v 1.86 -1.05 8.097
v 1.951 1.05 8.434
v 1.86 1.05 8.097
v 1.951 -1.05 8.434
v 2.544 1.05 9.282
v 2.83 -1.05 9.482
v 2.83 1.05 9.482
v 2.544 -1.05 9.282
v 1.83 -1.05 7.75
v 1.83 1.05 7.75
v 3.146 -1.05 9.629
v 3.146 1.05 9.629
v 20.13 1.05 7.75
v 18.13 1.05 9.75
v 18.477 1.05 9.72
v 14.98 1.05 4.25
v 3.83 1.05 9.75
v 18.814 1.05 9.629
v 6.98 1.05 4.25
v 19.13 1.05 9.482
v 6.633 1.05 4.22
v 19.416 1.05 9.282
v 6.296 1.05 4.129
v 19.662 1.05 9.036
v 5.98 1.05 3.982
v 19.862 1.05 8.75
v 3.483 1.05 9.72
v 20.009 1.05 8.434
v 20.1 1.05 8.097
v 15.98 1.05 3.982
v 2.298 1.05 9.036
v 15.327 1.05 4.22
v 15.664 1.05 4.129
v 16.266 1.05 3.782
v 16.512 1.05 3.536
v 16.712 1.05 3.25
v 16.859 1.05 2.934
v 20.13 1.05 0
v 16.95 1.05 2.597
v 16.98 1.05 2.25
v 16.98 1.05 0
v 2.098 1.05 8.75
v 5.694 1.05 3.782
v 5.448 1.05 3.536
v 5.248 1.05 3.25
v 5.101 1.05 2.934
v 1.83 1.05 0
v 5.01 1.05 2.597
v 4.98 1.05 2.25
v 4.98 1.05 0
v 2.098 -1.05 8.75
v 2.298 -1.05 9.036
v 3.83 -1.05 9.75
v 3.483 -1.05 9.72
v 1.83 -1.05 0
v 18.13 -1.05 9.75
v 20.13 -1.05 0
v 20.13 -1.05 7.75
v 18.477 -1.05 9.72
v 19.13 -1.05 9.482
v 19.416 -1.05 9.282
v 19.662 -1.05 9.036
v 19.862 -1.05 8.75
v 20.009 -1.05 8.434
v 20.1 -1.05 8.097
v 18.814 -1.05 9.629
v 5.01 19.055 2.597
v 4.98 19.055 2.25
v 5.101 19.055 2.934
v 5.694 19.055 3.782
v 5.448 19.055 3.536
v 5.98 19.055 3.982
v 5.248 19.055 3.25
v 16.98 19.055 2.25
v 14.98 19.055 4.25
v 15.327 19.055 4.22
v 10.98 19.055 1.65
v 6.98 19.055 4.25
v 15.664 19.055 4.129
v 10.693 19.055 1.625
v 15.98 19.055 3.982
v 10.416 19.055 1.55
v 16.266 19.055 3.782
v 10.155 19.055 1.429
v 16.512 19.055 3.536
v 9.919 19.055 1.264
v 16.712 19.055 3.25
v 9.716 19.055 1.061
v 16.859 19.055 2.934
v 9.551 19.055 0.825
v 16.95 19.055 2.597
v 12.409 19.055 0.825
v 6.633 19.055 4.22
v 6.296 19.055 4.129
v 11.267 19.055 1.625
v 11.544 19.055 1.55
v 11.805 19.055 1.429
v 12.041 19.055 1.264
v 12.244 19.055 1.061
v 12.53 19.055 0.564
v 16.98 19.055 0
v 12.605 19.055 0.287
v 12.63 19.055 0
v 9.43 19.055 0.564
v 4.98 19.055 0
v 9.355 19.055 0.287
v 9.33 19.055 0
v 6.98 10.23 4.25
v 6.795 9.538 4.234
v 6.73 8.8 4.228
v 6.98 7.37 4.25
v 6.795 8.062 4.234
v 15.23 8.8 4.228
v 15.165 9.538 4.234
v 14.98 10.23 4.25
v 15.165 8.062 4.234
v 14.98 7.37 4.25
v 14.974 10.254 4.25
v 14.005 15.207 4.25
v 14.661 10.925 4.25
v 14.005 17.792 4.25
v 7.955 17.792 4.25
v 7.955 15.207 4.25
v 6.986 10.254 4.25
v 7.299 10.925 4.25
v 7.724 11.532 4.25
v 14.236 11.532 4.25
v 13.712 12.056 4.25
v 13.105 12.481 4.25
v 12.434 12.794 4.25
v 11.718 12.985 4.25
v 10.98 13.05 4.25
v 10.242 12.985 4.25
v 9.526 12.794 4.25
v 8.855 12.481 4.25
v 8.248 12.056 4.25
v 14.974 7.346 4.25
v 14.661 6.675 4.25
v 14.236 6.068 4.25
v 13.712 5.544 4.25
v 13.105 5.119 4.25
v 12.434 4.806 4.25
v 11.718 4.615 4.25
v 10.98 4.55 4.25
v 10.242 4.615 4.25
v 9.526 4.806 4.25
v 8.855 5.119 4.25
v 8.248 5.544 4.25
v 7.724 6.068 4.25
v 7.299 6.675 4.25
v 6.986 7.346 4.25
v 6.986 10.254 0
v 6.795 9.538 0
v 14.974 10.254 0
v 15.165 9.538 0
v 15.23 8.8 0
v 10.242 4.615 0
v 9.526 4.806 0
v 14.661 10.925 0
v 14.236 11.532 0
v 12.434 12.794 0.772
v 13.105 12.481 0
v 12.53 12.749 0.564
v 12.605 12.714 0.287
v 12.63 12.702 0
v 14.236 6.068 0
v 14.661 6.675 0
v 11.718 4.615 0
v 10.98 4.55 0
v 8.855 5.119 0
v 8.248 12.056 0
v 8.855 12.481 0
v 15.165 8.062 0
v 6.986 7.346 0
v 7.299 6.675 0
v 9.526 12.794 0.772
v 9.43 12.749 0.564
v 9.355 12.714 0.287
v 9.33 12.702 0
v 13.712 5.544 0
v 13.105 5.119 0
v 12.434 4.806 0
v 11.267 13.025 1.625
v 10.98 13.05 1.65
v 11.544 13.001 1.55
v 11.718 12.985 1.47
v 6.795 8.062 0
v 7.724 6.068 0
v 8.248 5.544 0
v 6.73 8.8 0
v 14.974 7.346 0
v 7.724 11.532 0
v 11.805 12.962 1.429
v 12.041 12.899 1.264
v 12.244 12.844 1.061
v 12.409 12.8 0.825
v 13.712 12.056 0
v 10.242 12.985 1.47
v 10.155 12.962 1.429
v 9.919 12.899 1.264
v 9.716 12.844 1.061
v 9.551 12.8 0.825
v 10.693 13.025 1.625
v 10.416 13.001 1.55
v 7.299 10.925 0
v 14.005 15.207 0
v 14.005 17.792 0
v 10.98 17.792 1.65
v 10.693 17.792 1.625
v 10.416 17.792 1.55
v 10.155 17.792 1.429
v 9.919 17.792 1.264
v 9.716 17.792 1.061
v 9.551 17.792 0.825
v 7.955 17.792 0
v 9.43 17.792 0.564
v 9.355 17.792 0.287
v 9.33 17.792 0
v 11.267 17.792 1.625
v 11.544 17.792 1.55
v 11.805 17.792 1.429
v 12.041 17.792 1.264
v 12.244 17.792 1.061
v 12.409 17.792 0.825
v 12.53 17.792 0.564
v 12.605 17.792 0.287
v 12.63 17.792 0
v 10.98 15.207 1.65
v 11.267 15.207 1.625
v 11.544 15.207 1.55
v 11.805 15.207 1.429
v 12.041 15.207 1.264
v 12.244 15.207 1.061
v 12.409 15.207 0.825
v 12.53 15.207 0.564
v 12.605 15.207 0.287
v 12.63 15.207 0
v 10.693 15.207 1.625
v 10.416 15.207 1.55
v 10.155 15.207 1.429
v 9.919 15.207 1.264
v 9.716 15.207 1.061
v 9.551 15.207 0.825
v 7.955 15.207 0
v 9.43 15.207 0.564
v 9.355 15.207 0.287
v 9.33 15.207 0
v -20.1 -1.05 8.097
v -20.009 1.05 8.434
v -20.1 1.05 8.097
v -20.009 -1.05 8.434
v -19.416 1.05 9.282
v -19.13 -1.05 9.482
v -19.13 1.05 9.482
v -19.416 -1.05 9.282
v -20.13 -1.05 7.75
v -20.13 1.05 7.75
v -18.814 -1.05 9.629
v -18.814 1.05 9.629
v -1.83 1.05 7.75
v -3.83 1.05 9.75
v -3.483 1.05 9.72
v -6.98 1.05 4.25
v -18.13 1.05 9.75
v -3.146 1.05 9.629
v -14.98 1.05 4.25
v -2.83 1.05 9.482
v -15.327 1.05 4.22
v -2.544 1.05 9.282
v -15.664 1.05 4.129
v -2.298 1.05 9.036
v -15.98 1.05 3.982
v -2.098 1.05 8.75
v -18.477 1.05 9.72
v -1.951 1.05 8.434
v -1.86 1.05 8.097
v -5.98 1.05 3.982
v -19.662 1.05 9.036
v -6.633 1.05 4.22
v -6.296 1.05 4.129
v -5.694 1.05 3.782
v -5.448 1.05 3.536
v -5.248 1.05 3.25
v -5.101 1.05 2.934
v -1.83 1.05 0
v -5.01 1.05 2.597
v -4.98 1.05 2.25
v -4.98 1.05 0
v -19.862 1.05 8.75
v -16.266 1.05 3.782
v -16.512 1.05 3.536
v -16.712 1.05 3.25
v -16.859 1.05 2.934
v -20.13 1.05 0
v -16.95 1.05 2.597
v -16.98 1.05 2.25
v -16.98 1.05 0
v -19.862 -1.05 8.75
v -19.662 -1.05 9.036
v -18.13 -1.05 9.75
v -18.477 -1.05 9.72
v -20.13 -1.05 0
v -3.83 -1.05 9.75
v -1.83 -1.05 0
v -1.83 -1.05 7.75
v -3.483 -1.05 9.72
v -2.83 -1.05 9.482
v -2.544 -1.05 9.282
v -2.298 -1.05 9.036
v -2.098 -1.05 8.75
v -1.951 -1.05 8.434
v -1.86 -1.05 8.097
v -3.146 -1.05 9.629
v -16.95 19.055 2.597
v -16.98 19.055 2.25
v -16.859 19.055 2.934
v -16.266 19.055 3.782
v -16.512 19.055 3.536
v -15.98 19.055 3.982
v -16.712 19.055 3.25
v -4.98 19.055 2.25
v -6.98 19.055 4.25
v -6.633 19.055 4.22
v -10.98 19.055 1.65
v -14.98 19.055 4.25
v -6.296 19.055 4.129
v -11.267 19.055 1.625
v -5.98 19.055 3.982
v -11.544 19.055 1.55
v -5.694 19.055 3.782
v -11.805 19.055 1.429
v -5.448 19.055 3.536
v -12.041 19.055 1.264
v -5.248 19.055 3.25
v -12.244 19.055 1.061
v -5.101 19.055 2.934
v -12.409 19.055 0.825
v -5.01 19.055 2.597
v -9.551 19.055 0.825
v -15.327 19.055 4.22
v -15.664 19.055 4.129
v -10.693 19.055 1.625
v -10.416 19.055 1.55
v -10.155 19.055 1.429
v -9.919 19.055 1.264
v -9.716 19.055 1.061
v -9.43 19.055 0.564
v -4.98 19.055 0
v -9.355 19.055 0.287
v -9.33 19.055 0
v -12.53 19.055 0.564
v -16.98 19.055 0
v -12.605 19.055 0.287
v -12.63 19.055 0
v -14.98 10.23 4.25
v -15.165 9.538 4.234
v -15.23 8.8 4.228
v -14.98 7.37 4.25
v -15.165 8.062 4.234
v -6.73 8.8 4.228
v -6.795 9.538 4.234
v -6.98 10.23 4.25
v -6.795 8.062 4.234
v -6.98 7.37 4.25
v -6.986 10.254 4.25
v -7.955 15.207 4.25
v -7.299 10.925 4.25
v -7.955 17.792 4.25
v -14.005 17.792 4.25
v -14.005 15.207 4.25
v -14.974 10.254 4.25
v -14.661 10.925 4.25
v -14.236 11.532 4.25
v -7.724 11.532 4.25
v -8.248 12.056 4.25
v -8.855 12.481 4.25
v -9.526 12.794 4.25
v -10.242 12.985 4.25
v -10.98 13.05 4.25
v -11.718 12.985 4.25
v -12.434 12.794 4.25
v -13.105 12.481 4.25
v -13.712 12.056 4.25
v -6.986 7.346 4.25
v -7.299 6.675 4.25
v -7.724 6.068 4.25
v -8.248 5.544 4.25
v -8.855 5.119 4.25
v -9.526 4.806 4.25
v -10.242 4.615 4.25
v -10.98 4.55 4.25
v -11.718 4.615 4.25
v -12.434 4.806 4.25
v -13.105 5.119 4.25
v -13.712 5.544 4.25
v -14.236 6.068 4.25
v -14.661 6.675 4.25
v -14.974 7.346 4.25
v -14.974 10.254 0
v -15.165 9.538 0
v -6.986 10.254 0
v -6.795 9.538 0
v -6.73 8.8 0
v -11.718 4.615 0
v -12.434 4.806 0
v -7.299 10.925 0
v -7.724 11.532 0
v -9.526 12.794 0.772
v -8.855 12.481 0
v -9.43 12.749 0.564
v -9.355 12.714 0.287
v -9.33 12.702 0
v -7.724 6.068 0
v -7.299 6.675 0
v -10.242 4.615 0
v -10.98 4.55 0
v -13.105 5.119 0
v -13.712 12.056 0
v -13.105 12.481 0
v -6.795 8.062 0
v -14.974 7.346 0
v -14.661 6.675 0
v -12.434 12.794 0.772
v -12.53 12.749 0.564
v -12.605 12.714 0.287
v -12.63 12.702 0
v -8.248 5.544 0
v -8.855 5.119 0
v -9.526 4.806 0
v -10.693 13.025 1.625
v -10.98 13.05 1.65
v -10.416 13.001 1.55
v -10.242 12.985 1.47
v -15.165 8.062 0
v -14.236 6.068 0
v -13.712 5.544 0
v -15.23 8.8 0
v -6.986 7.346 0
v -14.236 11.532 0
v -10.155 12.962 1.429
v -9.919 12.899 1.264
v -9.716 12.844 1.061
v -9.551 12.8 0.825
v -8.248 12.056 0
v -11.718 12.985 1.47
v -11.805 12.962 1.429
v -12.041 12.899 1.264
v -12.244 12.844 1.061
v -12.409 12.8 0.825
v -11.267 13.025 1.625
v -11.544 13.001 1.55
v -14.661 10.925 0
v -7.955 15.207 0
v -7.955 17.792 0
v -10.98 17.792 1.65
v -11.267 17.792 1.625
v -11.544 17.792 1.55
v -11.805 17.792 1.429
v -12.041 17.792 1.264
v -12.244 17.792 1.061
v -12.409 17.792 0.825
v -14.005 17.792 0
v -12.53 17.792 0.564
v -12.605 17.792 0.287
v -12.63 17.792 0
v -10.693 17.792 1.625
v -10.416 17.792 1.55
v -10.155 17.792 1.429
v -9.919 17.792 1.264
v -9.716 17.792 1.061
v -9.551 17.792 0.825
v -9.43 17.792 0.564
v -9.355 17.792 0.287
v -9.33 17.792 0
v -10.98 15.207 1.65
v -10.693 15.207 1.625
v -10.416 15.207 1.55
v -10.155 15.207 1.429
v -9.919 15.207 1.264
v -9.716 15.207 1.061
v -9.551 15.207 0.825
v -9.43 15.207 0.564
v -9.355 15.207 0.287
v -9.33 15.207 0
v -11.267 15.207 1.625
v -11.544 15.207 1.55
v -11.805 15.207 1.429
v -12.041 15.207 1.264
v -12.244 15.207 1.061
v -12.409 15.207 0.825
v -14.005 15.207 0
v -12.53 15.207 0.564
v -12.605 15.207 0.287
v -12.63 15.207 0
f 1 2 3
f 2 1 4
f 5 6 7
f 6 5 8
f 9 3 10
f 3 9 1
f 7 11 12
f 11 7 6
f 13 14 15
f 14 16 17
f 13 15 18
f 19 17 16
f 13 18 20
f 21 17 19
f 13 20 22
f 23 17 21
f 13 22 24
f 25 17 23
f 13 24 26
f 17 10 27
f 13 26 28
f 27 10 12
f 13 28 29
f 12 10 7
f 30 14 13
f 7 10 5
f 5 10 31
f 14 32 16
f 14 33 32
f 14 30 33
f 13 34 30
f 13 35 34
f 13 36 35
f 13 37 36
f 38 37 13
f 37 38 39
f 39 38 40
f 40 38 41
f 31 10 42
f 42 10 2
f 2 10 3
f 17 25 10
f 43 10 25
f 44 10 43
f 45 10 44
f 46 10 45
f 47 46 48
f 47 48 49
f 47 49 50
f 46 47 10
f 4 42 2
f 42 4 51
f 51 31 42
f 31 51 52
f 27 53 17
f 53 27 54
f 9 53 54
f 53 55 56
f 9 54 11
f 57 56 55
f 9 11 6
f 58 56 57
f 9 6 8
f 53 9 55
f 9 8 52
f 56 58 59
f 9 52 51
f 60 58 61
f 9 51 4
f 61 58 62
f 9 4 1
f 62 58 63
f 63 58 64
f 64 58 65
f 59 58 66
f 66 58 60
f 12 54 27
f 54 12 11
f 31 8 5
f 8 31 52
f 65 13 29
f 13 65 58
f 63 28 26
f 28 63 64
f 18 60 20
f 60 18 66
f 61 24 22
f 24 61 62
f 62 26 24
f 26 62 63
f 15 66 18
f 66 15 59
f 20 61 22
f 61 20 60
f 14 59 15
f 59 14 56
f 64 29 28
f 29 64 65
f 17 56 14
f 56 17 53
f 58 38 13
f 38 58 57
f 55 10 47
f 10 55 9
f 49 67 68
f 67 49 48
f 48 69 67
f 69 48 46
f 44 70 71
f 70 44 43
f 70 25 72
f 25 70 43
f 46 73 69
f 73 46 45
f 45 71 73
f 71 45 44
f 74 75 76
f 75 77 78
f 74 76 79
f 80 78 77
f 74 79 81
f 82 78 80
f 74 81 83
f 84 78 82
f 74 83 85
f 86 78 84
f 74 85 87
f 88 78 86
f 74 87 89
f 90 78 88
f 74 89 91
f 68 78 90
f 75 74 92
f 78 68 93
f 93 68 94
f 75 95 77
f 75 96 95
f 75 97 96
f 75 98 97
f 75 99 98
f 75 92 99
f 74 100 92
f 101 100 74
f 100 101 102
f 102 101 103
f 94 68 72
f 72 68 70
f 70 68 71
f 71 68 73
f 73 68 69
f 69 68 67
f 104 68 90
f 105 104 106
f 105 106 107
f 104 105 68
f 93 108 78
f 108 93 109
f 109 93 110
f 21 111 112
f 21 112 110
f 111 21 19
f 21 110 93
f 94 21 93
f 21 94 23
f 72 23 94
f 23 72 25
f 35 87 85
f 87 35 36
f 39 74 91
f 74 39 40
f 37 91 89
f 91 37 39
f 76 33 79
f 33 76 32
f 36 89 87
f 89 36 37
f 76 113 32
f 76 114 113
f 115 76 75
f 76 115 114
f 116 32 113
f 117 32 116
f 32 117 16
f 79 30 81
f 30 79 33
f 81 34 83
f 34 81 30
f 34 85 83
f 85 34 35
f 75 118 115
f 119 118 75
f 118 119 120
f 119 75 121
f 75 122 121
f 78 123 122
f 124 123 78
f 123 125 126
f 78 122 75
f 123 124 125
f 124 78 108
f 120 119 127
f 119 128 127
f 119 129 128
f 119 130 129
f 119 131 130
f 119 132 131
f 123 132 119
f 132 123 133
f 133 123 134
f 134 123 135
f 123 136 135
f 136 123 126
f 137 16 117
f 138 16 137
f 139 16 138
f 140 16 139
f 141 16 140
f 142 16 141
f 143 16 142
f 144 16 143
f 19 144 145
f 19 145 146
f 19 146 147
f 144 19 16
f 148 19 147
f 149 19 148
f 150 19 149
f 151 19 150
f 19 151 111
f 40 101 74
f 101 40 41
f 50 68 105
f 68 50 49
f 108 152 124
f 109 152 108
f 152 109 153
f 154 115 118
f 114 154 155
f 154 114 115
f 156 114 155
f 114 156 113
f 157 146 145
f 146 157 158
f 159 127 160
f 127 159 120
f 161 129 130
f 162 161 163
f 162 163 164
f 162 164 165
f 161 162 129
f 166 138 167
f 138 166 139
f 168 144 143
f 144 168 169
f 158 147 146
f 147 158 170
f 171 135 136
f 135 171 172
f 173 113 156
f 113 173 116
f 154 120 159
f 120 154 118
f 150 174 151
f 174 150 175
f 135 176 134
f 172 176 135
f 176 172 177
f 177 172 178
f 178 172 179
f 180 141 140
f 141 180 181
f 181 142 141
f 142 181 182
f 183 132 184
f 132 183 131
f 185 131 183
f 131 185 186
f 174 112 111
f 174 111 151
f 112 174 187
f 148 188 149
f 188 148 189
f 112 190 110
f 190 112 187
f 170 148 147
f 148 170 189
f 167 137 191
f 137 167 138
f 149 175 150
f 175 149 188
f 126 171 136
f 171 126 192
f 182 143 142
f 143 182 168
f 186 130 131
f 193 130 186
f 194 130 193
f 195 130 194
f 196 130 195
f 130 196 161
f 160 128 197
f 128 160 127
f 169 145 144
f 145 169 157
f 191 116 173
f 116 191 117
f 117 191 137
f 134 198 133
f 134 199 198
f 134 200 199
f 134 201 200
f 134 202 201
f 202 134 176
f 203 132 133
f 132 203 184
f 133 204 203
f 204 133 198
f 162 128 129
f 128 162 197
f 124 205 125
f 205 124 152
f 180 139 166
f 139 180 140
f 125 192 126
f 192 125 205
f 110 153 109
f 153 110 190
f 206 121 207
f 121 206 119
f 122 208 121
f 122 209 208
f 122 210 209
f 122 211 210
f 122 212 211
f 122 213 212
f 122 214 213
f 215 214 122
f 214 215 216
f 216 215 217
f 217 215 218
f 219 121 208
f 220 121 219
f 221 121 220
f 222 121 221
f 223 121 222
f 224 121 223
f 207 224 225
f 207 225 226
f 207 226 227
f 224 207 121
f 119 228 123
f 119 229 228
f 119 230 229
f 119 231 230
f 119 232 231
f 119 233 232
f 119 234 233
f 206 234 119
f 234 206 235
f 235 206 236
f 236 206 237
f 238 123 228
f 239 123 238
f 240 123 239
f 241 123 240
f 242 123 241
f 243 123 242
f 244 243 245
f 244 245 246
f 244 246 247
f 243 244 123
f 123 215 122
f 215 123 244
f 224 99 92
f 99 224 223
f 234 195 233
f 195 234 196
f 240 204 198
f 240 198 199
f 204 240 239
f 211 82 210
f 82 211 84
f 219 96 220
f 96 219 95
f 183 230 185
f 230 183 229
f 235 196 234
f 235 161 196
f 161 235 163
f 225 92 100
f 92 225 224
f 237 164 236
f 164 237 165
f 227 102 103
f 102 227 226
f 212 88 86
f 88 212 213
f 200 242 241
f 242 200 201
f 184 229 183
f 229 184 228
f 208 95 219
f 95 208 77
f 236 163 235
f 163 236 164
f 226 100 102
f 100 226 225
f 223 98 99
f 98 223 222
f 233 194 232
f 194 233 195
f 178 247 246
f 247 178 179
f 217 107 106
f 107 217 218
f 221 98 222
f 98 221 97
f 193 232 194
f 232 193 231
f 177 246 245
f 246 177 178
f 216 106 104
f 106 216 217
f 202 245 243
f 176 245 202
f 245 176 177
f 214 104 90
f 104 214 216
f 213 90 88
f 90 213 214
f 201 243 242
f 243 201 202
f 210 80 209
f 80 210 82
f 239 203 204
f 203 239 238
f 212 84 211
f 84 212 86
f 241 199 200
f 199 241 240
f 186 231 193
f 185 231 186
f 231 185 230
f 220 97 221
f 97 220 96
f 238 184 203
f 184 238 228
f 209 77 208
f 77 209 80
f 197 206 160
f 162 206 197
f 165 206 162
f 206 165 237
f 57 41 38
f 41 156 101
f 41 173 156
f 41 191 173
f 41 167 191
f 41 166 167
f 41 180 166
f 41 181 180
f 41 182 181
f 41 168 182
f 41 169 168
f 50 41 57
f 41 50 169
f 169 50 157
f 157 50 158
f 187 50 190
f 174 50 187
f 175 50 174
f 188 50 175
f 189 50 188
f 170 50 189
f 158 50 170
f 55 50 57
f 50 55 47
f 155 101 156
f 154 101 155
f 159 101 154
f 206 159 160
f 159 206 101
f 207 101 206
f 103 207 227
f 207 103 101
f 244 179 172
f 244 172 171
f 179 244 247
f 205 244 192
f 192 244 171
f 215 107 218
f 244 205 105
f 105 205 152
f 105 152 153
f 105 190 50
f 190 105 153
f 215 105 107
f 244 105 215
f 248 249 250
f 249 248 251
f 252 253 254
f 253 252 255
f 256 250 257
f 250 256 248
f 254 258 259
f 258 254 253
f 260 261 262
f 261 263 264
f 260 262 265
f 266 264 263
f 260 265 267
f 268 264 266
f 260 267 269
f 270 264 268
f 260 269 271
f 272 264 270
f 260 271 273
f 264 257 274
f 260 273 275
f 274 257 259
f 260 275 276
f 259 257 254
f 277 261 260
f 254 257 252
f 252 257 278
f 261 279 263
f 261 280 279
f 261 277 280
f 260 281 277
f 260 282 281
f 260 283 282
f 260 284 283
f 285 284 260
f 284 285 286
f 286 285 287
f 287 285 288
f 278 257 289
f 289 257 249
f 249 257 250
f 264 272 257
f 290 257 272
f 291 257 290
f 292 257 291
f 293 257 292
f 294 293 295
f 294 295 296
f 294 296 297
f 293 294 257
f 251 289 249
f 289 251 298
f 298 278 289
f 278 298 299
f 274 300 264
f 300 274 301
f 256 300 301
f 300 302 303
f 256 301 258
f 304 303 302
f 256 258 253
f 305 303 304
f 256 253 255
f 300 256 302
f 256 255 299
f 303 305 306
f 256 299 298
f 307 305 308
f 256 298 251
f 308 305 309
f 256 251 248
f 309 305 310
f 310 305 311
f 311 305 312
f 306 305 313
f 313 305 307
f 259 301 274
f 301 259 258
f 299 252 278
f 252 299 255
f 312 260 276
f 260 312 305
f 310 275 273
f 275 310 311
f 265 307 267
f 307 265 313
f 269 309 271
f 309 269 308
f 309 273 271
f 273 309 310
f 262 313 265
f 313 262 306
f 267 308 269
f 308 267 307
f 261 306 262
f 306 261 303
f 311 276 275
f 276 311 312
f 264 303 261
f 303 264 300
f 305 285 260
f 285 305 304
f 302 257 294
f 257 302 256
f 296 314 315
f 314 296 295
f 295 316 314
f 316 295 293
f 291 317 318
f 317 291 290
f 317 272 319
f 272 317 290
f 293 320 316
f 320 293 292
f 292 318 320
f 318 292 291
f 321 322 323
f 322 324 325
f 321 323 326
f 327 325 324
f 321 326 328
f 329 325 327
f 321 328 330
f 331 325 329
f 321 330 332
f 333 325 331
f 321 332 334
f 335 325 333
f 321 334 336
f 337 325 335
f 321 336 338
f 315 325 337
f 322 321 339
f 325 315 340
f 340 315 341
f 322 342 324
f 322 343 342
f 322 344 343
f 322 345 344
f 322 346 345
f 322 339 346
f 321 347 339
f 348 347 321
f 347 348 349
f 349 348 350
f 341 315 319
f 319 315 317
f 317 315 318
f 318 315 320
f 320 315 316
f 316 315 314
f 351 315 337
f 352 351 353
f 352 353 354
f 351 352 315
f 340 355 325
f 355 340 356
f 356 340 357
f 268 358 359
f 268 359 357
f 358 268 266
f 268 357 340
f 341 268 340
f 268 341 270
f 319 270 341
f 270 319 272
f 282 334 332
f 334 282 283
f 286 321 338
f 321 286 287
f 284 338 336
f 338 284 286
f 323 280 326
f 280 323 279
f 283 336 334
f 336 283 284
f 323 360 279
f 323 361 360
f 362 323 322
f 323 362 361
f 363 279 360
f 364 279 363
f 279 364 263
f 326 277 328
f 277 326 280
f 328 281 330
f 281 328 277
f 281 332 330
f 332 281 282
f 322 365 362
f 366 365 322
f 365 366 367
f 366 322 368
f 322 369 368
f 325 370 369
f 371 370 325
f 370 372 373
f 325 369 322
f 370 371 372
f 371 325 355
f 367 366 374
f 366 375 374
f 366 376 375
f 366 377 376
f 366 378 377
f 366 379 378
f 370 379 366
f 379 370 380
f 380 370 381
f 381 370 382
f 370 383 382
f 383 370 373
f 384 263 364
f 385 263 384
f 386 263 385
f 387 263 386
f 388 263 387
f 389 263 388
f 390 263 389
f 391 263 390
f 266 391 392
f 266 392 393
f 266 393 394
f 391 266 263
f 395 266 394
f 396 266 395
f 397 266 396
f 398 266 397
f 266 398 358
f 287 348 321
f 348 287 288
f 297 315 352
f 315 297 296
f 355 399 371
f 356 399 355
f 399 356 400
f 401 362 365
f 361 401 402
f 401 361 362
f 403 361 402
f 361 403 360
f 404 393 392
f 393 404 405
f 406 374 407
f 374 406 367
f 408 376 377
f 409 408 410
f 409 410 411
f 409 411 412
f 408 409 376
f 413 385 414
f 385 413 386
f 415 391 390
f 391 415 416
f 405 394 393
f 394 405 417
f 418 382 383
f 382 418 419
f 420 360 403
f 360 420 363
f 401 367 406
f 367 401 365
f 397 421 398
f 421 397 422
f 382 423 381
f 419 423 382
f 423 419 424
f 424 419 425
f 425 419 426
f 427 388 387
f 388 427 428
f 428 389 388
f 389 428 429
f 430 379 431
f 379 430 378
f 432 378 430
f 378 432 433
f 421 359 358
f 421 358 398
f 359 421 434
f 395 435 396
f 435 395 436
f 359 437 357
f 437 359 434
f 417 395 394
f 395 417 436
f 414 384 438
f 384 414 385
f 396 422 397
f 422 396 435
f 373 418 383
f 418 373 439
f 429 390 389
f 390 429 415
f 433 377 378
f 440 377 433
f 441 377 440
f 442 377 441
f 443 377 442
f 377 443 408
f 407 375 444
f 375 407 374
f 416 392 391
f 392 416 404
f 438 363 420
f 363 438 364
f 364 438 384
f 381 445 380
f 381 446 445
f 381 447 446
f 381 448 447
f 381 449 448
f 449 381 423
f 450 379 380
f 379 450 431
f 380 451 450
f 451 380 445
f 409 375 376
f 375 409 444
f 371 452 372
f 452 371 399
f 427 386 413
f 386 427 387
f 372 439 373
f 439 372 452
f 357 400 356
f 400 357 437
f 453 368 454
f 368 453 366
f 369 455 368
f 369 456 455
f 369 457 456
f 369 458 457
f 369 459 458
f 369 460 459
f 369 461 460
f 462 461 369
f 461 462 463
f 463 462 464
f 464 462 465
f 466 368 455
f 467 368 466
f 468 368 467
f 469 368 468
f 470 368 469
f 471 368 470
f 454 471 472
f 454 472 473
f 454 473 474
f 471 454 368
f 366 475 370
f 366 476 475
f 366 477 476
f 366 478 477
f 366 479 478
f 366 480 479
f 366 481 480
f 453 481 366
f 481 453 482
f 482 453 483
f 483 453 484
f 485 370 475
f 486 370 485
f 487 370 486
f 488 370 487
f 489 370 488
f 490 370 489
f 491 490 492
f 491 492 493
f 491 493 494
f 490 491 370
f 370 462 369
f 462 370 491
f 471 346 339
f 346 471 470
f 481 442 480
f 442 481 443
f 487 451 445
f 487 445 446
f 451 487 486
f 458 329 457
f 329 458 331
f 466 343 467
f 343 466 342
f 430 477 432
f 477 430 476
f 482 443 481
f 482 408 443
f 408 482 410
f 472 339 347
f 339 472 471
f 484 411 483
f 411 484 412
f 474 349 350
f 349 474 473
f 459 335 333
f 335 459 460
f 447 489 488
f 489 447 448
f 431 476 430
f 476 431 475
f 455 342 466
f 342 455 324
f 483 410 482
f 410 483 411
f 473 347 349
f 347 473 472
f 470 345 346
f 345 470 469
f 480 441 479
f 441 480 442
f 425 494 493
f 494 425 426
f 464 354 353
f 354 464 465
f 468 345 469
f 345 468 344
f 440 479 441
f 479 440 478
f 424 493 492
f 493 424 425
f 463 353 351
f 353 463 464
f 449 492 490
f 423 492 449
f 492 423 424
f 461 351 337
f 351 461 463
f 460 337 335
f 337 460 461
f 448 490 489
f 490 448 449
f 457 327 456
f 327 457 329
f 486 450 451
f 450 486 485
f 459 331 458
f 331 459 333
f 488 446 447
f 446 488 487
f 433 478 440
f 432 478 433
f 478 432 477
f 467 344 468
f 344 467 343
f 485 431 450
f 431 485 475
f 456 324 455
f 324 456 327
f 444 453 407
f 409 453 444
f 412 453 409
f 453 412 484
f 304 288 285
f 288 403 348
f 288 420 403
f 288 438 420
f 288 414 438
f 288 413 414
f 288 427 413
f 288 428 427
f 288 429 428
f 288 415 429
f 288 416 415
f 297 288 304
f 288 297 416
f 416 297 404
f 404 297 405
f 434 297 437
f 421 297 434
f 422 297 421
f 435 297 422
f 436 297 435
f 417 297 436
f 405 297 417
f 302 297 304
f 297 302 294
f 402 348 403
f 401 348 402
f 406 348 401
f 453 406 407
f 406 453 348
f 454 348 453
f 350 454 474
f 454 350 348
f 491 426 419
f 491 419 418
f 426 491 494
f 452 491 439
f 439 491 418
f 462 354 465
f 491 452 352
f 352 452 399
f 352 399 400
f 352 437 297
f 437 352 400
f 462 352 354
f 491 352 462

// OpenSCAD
/*

Revison Notes:
  RV0: 
    * remove support inside shoe - not needed
    *
  RV1:
    * only using shoe and sleeve 
    * supports did not print.  too thin?
    * decrease shoeX by .2
  RV2:
    * still a mess - the hole makes a huge mess
  RV3:
    * flip it on it's side, cut in half, glue together

*/

include<MCAD/boxes.scad>

/* [Global] */
//Rounded Box Corder Radi
corner=2;
//Curve Refinement
$fn=36;
//Nut Thickness (M5 Default)
nutThickness=2.35;
//Distance Across Flats
nutFlat=5.5;
//Bolt Diameter
boltDia=3;
//Bolt Head Diameter
boltHeadDia=5.5;
//Bolt Head Thickess
boltHeadTh=3;
//Percentage Slop to Add to Holes and Inset
slop=1.1;


/* [Shoe Dimensions] */
//Width (plane of LCD)
shoeX=18.3; 
//Depth (plane of lens barrel)
shoeY=19.5; 
//Thickness
shoeZ=2.1;


/* [Dowel Sleeve] */
//Dowel Diameter
dowelD=8.5;
//Sleeve X
sleeveX=12;
//Sleeve Y
sleeveY=8.5;

//Sleeve Thickness
sleeveZ=18;


/* [Hidden] */
//overage to add to shapes to be unioned
ovr=.01;
//calculated values

//Nuts and Bolts
nutF=nutFlat*slop; //nut Flat
boltR=.5*boltDia*slop; //bolt radius
nutR=.5*nutF*1/cos(30); //nut radius
nutT=nutThickness*slop; //nut thickness
boltHRad=.5*boltHeadDia*slop;
boltHTh=boltHeadTh*slop;

//Dowel Sleeve
dowelR=dowelD/2;
//sleeveX=dowelR*3;
//sleeveY=dowelR*2+nutT*5;


module Shoe() {
  difference() {
    union() {
      //hot shoe
      roundedBox([shoeX, shoeY, shoeZ], corner, sidesonly=1);
      translate([0, 0, sleeveZ/2+shoeZ/2])
        roundedBox([sleeveX, sleeveY, sleeveZ+ovr], corner, sidesonly=1); 
    } //end union
    // dowel hole
    translate([0, 0, dowelR+shoeZ/2+3.5]) rotate([90, 0, 0]) 
      cylinder(h=sleeveY+ovr, r=dowelR, center=true);
    // nut hole
    translate([0, 0, sleeveZ/5*4+shoeZ])
      cube([nutF, .5*sleeveZ+nutR*1.05, nutT], center=true);
    // bolt hole
    translate([0, 0, -shoeZ+sleeveZ]) cylinder(h=sleeveZ, r=boltR, center=true);
  }
 
} // end Shoe

module CutHalf() {
//Front
  difference() {
    Shoe();
    translate([0, shoeY, shoeZ+sleeveZ/2]) 
      cube([shoeX*2, shoeY*2, (shoeZ+sleeveZ)*2], center=true);
  }
}
//Front Half
rotate([-90, 0, 0]) translate([ shoeX/2*1.2, 0, 0])CutHalf();
rotate([-90, 0, 0]) translate([-shoeX/2*1.2, 0, 0])CutHalf();
